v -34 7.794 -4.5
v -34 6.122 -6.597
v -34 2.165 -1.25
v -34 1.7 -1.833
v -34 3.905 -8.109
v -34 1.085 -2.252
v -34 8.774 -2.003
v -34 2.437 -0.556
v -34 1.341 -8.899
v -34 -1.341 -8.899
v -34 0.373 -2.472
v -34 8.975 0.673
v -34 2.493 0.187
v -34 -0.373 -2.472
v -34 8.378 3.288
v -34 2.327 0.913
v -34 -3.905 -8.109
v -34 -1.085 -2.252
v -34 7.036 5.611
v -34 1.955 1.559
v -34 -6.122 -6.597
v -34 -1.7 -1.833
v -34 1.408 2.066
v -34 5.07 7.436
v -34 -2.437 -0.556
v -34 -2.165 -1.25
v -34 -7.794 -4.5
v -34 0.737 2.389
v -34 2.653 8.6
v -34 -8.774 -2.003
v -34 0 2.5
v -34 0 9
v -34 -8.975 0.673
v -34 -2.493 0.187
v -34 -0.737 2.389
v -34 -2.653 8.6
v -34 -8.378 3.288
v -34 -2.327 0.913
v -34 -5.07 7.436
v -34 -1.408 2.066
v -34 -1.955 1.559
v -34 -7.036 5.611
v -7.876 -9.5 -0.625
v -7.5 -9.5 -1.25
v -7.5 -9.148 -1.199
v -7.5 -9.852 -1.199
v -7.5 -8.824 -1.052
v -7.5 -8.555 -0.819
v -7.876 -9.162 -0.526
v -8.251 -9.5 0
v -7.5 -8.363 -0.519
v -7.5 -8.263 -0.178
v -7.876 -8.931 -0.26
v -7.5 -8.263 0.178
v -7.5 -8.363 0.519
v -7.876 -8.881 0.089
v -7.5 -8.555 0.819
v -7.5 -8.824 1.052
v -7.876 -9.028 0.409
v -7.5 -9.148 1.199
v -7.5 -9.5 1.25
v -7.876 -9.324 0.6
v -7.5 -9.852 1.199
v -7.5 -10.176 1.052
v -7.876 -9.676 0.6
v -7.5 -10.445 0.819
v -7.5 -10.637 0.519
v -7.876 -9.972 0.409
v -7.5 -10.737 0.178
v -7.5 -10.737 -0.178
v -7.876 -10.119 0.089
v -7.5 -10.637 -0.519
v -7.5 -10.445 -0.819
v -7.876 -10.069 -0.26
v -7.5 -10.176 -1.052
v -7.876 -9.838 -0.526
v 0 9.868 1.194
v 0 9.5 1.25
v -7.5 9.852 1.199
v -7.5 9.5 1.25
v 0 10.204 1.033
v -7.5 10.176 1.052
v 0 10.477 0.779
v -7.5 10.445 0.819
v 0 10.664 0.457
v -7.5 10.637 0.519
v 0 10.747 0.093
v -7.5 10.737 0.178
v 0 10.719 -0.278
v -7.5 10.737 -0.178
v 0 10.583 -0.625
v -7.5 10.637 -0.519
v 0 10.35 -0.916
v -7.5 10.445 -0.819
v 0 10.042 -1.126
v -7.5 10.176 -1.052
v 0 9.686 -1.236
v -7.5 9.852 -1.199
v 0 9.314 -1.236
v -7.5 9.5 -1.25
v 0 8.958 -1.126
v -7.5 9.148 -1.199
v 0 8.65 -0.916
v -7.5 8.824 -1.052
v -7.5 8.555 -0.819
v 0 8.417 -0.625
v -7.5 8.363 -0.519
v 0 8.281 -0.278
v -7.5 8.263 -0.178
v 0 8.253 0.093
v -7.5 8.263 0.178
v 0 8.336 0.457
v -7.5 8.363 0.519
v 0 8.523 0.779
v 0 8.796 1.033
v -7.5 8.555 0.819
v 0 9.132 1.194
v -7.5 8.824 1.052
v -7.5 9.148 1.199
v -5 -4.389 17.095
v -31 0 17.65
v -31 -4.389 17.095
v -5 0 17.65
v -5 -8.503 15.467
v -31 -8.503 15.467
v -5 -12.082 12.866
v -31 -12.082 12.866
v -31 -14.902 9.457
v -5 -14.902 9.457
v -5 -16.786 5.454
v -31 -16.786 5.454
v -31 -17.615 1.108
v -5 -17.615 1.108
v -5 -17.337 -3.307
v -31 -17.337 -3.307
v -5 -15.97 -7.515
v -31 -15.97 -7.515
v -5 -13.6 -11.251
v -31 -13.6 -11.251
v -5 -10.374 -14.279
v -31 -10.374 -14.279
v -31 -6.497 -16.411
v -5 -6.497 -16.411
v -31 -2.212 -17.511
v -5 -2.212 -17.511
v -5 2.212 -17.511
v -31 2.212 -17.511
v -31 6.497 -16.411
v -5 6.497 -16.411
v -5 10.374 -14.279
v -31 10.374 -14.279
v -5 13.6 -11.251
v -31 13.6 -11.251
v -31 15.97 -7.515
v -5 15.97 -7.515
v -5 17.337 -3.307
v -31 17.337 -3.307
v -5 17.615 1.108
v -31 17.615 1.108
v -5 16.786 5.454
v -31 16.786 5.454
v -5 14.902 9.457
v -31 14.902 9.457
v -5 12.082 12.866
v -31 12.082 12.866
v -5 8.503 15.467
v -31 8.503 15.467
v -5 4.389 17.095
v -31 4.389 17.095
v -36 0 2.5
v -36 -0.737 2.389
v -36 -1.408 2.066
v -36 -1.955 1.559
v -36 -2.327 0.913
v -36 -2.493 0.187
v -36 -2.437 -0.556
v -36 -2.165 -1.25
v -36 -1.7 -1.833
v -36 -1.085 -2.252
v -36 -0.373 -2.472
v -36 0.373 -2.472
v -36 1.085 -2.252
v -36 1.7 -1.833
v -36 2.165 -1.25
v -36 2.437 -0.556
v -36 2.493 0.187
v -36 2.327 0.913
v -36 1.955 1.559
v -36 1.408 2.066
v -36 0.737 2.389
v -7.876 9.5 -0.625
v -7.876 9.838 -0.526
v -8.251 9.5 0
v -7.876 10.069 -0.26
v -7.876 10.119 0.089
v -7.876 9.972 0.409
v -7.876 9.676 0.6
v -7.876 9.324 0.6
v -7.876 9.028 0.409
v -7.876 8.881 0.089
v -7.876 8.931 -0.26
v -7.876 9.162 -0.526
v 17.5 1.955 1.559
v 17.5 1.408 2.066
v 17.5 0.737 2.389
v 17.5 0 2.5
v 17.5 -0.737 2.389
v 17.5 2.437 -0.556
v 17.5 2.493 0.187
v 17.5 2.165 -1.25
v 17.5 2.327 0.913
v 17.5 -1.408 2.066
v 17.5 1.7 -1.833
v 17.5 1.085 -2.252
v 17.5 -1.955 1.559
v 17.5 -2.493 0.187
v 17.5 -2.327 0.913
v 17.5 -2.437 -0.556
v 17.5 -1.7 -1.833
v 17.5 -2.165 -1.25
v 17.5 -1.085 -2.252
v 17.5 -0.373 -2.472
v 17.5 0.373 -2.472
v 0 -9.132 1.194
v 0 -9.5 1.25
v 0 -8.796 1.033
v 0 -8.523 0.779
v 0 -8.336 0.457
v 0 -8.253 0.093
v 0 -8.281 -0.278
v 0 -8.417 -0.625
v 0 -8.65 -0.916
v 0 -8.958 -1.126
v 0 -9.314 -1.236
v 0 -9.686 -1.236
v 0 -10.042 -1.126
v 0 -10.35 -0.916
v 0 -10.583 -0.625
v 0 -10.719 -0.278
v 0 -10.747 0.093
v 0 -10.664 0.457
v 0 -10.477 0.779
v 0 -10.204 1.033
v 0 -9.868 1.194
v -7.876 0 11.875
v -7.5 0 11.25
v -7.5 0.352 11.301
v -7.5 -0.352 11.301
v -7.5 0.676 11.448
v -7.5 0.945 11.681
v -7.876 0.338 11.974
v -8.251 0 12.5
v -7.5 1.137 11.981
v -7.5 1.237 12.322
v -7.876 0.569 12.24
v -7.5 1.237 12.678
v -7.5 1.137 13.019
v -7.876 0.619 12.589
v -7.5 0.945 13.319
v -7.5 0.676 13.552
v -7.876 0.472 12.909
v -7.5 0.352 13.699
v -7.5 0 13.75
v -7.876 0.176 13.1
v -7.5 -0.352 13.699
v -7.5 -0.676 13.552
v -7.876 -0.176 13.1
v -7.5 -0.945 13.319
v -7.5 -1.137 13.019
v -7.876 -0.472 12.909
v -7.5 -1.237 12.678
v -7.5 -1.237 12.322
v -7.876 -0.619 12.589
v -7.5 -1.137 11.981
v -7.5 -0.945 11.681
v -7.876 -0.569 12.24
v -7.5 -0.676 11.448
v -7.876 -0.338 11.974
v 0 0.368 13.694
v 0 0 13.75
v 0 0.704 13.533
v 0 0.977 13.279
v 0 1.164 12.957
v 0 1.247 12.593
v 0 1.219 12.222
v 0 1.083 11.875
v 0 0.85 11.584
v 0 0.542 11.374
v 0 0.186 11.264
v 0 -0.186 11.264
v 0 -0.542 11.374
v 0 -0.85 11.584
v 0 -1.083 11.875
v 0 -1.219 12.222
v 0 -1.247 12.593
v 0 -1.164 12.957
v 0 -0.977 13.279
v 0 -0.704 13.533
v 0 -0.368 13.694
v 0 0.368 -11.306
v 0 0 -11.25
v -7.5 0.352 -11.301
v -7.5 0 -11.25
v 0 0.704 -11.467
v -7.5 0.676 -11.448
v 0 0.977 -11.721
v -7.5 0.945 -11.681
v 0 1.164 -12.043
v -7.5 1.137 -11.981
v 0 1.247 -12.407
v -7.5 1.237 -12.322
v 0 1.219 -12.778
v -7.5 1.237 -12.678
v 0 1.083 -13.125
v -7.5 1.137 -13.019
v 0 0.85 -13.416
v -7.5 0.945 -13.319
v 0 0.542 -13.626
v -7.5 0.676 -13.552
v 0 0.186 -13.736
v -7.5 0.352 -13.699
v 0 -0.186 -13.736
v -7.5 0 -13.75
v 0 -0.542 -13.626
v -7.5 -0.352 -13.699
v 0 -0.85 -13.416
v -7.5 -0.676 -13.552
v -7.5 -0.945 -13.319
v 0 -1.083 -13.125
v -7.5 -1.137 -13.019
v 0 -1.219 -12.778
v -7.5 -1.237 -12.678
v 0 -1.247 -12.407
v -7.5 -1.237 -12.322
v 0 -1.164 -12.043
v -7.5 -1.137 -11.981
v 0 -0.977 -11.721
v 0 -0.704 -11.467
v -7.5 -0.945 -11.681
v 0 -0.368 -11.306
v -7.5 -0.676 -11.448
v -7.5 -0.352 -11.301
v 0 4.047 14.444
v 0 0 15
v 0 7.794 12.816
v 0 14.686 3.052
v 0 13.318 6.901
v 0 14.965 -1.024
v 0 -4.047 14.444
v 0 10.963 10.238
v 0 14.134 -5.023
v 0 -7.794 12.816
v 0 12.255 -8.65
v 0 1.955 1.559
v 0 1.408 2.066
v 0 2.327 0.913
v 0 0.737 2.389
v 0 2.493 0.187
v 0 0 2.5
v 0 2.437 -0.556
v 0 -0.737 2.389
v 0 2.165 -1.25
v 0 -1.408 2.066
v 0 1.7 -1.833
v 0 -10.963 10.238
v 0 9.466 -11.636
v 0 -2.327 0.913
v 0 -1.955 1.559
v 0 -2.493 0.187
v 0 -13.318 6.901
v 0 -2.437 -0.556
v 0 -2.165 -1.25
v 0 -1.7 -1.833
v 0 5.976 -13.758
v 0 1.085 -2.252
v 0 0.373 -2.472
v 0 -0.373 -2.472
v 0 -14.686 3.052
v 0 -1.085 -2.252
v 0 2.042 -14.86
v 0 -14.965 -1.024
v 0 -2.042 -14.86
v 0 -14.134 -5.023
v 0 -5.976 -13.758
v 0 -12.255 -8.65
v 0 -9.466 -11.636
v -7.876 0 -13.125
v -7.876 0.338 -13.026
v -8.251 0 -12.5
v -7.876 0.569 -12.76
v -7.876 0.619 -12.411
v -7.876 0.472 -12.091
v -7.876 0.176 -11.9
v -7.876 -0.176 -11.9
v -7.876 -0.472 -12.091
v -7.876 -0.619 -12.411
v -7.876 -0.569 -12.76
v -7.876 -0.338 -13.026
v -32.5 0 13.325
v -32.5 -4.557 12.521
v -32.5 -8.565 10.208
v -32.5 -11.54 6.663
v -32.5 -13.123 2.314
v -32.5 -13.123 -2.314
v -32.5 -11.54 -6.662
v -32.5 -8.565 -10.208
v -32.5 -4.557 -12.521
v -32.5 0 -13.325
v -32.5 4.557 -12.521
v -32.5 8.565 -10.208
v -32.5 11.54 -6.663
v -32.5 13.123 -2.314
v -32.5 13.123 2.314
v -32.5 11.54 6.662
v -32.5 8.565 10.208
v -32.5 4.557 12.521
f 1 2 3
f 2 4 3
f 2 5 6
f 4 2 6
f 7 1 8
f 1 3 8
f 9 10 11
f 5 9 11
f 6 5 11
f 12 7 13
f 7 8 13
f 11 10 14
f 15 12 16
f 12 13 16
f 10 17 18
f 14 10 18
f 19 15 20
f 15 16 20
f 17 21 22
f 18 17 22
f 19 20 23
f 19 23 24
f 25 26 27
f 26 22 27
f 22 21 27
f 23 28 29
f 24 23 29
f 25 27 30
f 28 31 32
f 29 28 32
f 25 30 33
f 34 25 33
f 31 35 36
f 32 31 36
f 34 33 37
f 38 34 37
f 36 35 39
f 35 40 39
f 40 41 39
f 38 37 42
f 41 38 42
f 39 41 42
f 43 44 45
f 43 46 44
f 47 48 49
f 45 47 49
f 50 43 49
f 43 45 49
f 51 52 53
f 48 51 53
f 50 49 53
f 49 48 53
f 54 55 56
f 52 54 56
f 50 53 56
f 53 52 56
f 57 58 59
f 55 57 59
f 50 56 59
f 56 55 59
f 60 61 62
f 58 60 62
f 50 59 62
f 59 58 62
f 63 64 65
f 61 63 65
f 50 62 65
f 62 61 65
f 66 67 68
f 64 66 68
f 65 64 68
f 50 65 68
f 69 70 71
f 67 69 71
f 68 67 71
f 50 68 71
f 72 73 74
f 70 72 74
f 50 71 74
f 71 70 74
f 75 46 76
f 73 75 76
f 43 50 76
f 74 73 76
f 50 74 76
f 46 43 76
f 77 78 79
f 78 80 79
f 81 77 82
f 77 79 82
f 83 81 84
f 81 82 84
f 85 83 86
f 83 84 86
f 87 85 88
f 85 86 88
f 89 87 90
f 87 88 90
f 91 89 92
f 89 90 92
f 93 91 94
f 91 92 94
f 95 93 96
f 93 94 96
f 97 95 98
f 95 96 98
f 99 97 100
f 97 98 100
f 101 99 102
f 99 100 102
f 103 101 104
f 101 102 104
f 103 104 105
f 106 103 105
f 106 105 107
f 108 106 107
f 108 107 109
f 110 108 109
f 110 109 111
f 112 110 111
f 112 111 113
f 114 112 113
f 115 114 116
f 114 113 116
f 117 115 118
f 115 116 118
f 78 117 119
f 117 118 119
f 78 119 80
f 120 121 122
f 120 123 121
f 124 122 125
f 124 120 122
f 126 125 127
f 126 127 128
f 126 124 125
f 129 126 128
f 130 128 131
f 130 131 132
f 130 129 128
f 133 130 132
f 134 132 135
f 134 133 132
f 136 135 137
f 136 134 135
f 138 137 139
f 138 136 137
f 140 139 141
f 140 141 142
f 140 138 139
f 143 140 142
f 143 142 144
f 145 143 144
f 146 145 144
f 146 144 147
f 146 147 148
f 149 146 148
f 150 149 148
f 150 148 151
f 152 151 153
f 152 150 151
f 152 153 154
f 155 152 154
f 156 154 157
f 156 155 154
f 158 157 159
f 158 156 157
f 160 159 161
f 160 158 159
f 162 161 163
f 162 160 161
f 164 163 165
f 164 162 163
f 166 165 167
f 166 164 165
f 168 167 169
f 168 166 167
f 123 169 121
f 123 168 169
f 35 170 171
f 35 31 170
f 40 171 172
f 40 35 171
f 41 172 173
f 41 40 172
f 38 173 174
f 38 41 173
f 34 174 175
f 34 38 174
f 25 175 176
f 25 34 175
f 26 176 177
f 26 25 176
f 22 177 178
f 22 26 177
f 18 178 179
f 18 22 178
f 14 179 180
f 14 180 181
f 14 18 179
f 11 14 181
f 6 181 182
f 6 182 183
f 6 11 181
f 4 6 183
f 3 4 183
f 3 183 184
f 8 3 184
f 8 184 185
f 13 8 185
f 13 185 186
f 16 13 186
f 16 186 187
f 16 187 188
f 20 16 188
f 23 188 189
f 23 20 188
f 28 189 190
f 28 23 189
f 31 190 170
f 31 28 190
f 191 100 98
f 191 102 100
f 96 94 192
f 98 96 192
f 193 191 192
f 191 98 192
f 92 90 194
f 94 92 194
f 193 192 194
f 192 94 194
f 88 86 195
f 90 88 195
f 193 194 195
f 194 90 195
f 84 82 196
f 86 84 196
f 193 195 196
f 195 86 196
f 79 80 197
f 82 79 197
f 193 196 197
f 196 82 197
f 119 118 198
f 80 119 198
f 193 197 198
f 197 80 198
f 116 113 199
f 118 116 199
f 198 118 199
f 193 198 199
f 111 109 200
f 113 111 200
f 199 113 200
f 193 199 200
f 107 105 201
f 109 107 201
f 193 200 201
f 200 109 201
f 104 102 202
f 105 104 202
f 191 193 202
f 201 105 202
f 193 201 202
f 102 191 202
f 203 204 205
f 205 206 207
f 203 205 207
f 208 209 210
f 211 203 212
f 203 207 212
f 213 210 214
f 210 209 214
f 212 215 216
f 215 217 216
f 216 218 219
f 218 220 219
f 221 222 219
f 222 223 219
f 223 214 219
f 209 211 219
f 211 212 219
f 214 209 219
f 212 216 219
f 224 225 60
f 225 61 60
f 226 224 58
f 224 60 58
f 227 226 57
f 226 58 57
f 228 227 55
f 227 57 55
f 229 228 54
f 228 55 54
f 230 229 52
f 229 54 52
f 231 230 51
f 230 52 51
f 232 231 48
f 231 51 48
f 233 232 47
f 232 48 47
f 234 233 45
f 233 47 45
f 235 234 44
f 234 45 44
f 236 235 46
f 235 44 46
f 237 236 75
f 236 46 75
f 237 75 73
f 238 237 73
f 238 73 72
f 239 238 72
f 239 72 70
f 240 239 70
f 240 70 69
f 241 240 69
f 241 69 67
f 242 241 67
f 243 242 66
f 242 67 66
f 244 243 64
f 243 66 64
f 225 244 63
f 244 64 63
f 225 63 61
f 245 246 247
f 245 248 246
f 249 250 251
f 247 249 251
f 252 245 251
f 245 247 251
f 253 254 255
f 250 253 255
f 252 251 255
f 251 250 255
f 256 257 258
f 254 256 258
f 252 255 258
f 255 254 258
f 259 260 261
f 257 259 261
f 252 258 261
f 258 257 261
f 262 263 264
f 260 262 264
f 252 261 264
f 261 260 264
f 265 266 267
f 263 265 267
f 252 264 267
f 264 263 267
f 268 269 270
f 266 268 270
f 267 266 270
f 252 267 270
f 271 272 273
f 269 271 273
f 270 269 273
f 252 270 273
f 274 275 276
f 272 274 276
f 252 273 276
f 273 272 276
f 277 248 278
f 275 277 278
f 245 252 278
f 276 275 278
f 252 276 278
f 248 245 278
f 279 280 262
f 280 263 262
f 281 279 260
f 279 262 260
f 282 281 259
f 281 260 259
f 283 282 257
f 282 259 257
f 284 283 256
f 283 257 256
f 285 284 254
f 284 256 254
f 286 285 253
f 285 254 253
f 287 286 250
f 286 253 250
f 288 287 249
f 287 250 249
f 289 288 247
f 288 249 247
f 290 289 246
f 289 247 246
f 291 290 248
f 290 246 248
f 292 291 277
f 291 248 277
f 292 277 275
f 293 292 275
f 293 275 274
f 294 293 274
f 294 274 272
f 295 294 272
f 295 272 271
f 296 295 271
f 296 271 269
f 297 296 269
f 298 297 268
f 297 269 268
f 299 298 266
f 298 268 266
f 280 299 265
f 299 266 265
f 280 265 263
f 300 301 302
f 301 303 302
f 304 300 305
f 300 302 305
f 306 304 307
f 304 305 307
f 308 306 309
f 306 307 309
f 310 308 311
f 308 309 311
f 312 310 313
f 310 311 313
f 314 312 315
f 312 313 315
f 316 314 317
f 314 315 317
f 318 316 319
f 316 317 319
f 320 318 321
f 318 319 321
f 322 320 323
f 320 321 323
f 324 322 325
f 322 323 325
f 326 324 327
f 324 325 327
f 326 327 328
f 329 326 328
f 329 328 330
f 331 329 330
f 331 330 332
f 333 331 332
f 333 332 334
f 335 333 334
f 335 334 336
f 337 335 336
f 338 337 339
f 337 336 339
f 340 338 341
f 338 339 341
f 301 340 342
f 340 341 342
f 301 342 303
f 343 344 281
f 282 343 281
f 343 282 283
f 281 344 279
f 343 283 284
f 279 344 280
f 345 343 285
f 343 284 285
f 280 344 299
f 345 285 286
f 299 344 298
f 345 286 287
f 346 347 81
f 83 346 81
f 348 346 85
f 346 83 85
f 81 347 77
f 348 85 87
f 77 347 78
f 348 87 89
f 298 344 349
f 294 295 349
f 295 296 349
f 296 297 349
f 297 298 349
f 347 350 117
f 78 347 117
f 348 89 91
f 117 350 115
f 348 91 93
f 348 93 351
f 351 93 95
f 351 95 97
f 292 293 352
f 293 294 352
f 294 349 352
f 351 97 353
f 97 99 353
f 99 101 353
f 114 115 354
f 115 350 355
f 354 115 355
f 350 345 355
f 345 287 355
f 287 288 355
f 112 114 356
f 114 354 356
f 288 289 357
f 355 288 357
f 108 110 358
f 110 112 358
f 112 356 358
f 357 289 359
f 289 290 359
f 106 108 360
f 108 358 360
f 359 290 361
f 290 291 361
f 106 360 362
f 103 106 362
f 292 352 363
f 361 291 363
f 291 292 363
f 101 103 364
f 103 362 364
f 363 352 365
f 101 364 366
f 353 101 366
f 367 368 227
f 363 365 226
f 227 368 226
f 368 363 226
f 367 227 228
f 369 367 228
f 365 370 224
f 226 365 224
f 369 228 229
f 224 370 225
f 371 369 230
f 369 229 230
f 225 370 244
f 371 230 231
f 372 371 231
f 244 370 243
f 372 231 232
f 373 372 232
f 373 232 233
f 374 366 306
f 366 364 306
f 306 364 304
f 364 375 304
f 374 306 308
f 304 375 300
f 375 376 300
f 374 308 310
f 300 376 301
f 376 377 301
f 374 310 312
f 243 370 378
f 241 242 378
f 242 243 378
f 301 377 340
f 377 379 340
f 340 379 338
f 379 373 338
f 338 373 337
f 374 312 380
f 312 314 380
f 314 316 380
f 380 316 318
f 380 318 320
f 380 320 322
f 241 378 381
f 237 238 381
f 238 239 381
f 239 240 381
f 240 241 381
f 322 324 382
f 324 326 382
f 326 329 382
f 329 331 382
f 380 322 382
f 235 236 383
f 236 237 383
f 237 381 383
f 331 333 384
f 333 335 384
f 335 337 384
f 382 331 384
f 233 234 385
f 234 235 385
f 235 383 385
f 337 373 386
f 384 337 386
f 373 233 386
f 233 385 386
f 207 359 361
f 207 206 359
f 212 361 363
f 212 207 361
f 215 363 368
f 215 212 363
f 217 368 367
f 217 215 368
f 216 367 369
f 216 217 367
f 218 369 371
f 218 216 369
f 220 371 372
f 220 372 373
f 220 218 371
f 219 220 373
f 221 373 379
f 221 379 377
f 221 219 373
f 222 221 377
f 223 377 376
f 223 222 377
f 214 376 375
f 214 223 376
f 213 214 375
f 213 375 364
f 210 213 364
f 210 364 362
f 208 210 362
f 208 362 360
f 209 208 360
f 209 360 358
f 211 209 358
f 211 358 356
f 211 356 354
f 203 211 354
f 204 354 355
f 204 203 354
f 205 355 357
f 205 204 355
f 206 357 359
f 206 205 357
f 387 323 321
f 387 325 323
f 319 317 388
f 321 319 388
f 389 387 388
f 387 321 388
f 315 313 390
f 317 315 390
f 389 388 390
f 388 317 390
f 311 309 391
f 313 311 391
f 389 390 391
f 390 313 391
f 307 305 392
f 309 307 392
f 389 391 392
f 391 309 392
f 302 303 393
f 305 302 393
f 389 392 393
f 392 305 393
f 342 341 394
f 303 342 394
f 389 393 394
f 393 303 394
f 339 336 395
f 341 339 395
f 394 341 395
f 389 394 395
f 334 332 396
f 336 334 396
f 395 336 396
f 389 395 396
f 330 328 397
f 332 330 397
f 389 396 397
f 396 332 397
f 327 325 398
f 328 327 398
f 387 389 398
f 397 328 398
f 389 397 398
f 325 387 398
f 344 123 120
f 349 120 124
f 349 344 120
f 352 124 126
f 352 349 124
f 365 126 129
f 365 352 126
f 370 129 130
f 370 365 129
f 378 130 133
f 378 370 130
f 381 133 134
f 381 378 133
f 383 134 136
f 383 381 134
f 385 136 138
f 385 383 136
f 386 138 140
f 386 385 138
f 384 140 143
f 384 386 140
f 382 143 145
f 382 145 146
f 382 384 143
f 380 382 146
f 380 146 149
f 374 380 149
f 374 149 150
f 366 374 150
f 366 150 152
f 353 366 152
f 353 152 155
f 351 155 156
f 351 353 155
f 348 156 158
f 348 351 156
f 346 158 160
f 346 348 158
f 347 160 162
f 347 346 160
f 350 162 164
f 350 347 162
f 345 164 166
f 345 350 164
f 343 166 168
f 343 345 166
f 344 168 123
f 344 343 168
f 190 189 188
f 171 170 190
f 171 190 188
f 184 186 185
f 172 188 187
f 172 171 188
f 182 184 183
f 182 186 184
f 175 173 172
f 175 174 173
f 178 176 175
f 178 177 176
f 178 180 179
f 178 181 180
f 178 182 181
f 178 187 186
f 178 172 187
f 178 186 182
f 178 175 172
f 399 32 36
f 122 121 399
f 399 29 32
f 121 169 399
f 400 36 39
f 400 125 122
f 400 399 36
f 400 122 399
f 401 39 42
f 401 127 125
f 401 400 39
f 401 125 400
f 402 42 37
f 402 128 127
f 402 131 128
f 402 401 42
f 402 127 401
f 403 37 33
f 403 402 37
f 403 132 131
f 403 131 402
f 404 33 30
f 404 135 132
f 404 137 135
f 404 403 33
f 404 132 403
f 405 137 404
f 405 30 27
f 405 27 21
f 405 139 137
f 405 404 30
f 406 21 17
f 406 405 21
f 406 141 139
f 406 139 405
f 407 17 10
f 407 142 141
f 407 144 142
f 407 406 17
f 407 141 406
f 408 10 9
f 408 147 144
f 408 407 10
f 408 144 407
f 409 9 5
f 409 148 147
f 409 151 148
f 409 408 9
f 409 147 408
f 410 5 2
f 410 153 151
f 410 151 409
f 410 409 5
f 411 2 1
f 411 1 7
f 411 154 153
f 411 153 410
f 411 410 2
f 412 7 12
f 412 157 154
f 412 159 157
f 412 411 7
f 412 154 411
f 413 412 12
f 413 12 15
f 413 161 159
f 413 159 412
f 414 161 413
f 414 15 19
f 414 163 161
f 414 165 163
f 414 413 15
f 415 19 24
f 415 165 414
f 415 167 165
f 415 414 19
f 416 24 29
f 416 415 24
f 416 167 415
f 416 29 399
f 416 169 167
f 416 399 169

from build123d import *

# Parameters (mm, degrees)
SKETCH1_3_W               = 17.5
SKETCH1_3_H               = 2.5
SKETCH1_3_W_2             = 2
M3X0_5_TAPPED_HOLE1_D     = 2.5
M3X0_5_TAPPED_HOLE1_DEPTH = 7.5
M3X0_5_TAPPED_HOLE1_TIP   = 0.751075774


with BuildPart() as part:
    # Sketch1 → Revolve1 (revolve)
    with BuildSketch(Plane.XY):
        Polygon((-34, 0), (0, 0), (0, 2.5), (0, 15), (-5, 17.65), (-31, 17.65), (-34, 9), (-34, 2.5), align=None)
    revolve(axis=Axis((1.227272727, 0, 0), (1, 0, 0)))

    # Sketch1<3> → Revolve2 (revolve)
    with BuildSketch(Plane.XY):
        with Locations((8.75, 1.25)):
            Rectangle(SKETCH1_3_W, SKETCH1_3_H)
        with Locations((-35, 1.25)):
            Rectangle(SKETCH1_3_W_2, SKETCH1_3_H)
    revolve(axis=Axis((1.227272727, 0, 0), (1, 0, 0)))

    # M3x0.5 Tapped Hole1
    with Locations(Plane(origin=(0, 0, 0), x_dir=(0, 0, -1), z_dir=(1, 0, 0))):
        with Locations((0, 9.5), (0, -9.5), (-12.5, 0), (12.5, 0)):
            Hole(M3X0_5_TAPPED_HOLE1_D / 2, depth=M3X0_5_TAPPED_HOLE1_DEPTH)
            with Locations((0, 0, -(M3X0_5_TAPPED_HOLE1_DEPTH + M3X0_5_TAPPED_HOLE1_TIP / 2))):  # 118° drill point
                Cone(0, M3X0_5_TAPPED_HOLE1_D / 2, M3X0_5_TAPPED_HOLE1_TIP, mode=Mode.SUBTRACT)


solid = part.part
